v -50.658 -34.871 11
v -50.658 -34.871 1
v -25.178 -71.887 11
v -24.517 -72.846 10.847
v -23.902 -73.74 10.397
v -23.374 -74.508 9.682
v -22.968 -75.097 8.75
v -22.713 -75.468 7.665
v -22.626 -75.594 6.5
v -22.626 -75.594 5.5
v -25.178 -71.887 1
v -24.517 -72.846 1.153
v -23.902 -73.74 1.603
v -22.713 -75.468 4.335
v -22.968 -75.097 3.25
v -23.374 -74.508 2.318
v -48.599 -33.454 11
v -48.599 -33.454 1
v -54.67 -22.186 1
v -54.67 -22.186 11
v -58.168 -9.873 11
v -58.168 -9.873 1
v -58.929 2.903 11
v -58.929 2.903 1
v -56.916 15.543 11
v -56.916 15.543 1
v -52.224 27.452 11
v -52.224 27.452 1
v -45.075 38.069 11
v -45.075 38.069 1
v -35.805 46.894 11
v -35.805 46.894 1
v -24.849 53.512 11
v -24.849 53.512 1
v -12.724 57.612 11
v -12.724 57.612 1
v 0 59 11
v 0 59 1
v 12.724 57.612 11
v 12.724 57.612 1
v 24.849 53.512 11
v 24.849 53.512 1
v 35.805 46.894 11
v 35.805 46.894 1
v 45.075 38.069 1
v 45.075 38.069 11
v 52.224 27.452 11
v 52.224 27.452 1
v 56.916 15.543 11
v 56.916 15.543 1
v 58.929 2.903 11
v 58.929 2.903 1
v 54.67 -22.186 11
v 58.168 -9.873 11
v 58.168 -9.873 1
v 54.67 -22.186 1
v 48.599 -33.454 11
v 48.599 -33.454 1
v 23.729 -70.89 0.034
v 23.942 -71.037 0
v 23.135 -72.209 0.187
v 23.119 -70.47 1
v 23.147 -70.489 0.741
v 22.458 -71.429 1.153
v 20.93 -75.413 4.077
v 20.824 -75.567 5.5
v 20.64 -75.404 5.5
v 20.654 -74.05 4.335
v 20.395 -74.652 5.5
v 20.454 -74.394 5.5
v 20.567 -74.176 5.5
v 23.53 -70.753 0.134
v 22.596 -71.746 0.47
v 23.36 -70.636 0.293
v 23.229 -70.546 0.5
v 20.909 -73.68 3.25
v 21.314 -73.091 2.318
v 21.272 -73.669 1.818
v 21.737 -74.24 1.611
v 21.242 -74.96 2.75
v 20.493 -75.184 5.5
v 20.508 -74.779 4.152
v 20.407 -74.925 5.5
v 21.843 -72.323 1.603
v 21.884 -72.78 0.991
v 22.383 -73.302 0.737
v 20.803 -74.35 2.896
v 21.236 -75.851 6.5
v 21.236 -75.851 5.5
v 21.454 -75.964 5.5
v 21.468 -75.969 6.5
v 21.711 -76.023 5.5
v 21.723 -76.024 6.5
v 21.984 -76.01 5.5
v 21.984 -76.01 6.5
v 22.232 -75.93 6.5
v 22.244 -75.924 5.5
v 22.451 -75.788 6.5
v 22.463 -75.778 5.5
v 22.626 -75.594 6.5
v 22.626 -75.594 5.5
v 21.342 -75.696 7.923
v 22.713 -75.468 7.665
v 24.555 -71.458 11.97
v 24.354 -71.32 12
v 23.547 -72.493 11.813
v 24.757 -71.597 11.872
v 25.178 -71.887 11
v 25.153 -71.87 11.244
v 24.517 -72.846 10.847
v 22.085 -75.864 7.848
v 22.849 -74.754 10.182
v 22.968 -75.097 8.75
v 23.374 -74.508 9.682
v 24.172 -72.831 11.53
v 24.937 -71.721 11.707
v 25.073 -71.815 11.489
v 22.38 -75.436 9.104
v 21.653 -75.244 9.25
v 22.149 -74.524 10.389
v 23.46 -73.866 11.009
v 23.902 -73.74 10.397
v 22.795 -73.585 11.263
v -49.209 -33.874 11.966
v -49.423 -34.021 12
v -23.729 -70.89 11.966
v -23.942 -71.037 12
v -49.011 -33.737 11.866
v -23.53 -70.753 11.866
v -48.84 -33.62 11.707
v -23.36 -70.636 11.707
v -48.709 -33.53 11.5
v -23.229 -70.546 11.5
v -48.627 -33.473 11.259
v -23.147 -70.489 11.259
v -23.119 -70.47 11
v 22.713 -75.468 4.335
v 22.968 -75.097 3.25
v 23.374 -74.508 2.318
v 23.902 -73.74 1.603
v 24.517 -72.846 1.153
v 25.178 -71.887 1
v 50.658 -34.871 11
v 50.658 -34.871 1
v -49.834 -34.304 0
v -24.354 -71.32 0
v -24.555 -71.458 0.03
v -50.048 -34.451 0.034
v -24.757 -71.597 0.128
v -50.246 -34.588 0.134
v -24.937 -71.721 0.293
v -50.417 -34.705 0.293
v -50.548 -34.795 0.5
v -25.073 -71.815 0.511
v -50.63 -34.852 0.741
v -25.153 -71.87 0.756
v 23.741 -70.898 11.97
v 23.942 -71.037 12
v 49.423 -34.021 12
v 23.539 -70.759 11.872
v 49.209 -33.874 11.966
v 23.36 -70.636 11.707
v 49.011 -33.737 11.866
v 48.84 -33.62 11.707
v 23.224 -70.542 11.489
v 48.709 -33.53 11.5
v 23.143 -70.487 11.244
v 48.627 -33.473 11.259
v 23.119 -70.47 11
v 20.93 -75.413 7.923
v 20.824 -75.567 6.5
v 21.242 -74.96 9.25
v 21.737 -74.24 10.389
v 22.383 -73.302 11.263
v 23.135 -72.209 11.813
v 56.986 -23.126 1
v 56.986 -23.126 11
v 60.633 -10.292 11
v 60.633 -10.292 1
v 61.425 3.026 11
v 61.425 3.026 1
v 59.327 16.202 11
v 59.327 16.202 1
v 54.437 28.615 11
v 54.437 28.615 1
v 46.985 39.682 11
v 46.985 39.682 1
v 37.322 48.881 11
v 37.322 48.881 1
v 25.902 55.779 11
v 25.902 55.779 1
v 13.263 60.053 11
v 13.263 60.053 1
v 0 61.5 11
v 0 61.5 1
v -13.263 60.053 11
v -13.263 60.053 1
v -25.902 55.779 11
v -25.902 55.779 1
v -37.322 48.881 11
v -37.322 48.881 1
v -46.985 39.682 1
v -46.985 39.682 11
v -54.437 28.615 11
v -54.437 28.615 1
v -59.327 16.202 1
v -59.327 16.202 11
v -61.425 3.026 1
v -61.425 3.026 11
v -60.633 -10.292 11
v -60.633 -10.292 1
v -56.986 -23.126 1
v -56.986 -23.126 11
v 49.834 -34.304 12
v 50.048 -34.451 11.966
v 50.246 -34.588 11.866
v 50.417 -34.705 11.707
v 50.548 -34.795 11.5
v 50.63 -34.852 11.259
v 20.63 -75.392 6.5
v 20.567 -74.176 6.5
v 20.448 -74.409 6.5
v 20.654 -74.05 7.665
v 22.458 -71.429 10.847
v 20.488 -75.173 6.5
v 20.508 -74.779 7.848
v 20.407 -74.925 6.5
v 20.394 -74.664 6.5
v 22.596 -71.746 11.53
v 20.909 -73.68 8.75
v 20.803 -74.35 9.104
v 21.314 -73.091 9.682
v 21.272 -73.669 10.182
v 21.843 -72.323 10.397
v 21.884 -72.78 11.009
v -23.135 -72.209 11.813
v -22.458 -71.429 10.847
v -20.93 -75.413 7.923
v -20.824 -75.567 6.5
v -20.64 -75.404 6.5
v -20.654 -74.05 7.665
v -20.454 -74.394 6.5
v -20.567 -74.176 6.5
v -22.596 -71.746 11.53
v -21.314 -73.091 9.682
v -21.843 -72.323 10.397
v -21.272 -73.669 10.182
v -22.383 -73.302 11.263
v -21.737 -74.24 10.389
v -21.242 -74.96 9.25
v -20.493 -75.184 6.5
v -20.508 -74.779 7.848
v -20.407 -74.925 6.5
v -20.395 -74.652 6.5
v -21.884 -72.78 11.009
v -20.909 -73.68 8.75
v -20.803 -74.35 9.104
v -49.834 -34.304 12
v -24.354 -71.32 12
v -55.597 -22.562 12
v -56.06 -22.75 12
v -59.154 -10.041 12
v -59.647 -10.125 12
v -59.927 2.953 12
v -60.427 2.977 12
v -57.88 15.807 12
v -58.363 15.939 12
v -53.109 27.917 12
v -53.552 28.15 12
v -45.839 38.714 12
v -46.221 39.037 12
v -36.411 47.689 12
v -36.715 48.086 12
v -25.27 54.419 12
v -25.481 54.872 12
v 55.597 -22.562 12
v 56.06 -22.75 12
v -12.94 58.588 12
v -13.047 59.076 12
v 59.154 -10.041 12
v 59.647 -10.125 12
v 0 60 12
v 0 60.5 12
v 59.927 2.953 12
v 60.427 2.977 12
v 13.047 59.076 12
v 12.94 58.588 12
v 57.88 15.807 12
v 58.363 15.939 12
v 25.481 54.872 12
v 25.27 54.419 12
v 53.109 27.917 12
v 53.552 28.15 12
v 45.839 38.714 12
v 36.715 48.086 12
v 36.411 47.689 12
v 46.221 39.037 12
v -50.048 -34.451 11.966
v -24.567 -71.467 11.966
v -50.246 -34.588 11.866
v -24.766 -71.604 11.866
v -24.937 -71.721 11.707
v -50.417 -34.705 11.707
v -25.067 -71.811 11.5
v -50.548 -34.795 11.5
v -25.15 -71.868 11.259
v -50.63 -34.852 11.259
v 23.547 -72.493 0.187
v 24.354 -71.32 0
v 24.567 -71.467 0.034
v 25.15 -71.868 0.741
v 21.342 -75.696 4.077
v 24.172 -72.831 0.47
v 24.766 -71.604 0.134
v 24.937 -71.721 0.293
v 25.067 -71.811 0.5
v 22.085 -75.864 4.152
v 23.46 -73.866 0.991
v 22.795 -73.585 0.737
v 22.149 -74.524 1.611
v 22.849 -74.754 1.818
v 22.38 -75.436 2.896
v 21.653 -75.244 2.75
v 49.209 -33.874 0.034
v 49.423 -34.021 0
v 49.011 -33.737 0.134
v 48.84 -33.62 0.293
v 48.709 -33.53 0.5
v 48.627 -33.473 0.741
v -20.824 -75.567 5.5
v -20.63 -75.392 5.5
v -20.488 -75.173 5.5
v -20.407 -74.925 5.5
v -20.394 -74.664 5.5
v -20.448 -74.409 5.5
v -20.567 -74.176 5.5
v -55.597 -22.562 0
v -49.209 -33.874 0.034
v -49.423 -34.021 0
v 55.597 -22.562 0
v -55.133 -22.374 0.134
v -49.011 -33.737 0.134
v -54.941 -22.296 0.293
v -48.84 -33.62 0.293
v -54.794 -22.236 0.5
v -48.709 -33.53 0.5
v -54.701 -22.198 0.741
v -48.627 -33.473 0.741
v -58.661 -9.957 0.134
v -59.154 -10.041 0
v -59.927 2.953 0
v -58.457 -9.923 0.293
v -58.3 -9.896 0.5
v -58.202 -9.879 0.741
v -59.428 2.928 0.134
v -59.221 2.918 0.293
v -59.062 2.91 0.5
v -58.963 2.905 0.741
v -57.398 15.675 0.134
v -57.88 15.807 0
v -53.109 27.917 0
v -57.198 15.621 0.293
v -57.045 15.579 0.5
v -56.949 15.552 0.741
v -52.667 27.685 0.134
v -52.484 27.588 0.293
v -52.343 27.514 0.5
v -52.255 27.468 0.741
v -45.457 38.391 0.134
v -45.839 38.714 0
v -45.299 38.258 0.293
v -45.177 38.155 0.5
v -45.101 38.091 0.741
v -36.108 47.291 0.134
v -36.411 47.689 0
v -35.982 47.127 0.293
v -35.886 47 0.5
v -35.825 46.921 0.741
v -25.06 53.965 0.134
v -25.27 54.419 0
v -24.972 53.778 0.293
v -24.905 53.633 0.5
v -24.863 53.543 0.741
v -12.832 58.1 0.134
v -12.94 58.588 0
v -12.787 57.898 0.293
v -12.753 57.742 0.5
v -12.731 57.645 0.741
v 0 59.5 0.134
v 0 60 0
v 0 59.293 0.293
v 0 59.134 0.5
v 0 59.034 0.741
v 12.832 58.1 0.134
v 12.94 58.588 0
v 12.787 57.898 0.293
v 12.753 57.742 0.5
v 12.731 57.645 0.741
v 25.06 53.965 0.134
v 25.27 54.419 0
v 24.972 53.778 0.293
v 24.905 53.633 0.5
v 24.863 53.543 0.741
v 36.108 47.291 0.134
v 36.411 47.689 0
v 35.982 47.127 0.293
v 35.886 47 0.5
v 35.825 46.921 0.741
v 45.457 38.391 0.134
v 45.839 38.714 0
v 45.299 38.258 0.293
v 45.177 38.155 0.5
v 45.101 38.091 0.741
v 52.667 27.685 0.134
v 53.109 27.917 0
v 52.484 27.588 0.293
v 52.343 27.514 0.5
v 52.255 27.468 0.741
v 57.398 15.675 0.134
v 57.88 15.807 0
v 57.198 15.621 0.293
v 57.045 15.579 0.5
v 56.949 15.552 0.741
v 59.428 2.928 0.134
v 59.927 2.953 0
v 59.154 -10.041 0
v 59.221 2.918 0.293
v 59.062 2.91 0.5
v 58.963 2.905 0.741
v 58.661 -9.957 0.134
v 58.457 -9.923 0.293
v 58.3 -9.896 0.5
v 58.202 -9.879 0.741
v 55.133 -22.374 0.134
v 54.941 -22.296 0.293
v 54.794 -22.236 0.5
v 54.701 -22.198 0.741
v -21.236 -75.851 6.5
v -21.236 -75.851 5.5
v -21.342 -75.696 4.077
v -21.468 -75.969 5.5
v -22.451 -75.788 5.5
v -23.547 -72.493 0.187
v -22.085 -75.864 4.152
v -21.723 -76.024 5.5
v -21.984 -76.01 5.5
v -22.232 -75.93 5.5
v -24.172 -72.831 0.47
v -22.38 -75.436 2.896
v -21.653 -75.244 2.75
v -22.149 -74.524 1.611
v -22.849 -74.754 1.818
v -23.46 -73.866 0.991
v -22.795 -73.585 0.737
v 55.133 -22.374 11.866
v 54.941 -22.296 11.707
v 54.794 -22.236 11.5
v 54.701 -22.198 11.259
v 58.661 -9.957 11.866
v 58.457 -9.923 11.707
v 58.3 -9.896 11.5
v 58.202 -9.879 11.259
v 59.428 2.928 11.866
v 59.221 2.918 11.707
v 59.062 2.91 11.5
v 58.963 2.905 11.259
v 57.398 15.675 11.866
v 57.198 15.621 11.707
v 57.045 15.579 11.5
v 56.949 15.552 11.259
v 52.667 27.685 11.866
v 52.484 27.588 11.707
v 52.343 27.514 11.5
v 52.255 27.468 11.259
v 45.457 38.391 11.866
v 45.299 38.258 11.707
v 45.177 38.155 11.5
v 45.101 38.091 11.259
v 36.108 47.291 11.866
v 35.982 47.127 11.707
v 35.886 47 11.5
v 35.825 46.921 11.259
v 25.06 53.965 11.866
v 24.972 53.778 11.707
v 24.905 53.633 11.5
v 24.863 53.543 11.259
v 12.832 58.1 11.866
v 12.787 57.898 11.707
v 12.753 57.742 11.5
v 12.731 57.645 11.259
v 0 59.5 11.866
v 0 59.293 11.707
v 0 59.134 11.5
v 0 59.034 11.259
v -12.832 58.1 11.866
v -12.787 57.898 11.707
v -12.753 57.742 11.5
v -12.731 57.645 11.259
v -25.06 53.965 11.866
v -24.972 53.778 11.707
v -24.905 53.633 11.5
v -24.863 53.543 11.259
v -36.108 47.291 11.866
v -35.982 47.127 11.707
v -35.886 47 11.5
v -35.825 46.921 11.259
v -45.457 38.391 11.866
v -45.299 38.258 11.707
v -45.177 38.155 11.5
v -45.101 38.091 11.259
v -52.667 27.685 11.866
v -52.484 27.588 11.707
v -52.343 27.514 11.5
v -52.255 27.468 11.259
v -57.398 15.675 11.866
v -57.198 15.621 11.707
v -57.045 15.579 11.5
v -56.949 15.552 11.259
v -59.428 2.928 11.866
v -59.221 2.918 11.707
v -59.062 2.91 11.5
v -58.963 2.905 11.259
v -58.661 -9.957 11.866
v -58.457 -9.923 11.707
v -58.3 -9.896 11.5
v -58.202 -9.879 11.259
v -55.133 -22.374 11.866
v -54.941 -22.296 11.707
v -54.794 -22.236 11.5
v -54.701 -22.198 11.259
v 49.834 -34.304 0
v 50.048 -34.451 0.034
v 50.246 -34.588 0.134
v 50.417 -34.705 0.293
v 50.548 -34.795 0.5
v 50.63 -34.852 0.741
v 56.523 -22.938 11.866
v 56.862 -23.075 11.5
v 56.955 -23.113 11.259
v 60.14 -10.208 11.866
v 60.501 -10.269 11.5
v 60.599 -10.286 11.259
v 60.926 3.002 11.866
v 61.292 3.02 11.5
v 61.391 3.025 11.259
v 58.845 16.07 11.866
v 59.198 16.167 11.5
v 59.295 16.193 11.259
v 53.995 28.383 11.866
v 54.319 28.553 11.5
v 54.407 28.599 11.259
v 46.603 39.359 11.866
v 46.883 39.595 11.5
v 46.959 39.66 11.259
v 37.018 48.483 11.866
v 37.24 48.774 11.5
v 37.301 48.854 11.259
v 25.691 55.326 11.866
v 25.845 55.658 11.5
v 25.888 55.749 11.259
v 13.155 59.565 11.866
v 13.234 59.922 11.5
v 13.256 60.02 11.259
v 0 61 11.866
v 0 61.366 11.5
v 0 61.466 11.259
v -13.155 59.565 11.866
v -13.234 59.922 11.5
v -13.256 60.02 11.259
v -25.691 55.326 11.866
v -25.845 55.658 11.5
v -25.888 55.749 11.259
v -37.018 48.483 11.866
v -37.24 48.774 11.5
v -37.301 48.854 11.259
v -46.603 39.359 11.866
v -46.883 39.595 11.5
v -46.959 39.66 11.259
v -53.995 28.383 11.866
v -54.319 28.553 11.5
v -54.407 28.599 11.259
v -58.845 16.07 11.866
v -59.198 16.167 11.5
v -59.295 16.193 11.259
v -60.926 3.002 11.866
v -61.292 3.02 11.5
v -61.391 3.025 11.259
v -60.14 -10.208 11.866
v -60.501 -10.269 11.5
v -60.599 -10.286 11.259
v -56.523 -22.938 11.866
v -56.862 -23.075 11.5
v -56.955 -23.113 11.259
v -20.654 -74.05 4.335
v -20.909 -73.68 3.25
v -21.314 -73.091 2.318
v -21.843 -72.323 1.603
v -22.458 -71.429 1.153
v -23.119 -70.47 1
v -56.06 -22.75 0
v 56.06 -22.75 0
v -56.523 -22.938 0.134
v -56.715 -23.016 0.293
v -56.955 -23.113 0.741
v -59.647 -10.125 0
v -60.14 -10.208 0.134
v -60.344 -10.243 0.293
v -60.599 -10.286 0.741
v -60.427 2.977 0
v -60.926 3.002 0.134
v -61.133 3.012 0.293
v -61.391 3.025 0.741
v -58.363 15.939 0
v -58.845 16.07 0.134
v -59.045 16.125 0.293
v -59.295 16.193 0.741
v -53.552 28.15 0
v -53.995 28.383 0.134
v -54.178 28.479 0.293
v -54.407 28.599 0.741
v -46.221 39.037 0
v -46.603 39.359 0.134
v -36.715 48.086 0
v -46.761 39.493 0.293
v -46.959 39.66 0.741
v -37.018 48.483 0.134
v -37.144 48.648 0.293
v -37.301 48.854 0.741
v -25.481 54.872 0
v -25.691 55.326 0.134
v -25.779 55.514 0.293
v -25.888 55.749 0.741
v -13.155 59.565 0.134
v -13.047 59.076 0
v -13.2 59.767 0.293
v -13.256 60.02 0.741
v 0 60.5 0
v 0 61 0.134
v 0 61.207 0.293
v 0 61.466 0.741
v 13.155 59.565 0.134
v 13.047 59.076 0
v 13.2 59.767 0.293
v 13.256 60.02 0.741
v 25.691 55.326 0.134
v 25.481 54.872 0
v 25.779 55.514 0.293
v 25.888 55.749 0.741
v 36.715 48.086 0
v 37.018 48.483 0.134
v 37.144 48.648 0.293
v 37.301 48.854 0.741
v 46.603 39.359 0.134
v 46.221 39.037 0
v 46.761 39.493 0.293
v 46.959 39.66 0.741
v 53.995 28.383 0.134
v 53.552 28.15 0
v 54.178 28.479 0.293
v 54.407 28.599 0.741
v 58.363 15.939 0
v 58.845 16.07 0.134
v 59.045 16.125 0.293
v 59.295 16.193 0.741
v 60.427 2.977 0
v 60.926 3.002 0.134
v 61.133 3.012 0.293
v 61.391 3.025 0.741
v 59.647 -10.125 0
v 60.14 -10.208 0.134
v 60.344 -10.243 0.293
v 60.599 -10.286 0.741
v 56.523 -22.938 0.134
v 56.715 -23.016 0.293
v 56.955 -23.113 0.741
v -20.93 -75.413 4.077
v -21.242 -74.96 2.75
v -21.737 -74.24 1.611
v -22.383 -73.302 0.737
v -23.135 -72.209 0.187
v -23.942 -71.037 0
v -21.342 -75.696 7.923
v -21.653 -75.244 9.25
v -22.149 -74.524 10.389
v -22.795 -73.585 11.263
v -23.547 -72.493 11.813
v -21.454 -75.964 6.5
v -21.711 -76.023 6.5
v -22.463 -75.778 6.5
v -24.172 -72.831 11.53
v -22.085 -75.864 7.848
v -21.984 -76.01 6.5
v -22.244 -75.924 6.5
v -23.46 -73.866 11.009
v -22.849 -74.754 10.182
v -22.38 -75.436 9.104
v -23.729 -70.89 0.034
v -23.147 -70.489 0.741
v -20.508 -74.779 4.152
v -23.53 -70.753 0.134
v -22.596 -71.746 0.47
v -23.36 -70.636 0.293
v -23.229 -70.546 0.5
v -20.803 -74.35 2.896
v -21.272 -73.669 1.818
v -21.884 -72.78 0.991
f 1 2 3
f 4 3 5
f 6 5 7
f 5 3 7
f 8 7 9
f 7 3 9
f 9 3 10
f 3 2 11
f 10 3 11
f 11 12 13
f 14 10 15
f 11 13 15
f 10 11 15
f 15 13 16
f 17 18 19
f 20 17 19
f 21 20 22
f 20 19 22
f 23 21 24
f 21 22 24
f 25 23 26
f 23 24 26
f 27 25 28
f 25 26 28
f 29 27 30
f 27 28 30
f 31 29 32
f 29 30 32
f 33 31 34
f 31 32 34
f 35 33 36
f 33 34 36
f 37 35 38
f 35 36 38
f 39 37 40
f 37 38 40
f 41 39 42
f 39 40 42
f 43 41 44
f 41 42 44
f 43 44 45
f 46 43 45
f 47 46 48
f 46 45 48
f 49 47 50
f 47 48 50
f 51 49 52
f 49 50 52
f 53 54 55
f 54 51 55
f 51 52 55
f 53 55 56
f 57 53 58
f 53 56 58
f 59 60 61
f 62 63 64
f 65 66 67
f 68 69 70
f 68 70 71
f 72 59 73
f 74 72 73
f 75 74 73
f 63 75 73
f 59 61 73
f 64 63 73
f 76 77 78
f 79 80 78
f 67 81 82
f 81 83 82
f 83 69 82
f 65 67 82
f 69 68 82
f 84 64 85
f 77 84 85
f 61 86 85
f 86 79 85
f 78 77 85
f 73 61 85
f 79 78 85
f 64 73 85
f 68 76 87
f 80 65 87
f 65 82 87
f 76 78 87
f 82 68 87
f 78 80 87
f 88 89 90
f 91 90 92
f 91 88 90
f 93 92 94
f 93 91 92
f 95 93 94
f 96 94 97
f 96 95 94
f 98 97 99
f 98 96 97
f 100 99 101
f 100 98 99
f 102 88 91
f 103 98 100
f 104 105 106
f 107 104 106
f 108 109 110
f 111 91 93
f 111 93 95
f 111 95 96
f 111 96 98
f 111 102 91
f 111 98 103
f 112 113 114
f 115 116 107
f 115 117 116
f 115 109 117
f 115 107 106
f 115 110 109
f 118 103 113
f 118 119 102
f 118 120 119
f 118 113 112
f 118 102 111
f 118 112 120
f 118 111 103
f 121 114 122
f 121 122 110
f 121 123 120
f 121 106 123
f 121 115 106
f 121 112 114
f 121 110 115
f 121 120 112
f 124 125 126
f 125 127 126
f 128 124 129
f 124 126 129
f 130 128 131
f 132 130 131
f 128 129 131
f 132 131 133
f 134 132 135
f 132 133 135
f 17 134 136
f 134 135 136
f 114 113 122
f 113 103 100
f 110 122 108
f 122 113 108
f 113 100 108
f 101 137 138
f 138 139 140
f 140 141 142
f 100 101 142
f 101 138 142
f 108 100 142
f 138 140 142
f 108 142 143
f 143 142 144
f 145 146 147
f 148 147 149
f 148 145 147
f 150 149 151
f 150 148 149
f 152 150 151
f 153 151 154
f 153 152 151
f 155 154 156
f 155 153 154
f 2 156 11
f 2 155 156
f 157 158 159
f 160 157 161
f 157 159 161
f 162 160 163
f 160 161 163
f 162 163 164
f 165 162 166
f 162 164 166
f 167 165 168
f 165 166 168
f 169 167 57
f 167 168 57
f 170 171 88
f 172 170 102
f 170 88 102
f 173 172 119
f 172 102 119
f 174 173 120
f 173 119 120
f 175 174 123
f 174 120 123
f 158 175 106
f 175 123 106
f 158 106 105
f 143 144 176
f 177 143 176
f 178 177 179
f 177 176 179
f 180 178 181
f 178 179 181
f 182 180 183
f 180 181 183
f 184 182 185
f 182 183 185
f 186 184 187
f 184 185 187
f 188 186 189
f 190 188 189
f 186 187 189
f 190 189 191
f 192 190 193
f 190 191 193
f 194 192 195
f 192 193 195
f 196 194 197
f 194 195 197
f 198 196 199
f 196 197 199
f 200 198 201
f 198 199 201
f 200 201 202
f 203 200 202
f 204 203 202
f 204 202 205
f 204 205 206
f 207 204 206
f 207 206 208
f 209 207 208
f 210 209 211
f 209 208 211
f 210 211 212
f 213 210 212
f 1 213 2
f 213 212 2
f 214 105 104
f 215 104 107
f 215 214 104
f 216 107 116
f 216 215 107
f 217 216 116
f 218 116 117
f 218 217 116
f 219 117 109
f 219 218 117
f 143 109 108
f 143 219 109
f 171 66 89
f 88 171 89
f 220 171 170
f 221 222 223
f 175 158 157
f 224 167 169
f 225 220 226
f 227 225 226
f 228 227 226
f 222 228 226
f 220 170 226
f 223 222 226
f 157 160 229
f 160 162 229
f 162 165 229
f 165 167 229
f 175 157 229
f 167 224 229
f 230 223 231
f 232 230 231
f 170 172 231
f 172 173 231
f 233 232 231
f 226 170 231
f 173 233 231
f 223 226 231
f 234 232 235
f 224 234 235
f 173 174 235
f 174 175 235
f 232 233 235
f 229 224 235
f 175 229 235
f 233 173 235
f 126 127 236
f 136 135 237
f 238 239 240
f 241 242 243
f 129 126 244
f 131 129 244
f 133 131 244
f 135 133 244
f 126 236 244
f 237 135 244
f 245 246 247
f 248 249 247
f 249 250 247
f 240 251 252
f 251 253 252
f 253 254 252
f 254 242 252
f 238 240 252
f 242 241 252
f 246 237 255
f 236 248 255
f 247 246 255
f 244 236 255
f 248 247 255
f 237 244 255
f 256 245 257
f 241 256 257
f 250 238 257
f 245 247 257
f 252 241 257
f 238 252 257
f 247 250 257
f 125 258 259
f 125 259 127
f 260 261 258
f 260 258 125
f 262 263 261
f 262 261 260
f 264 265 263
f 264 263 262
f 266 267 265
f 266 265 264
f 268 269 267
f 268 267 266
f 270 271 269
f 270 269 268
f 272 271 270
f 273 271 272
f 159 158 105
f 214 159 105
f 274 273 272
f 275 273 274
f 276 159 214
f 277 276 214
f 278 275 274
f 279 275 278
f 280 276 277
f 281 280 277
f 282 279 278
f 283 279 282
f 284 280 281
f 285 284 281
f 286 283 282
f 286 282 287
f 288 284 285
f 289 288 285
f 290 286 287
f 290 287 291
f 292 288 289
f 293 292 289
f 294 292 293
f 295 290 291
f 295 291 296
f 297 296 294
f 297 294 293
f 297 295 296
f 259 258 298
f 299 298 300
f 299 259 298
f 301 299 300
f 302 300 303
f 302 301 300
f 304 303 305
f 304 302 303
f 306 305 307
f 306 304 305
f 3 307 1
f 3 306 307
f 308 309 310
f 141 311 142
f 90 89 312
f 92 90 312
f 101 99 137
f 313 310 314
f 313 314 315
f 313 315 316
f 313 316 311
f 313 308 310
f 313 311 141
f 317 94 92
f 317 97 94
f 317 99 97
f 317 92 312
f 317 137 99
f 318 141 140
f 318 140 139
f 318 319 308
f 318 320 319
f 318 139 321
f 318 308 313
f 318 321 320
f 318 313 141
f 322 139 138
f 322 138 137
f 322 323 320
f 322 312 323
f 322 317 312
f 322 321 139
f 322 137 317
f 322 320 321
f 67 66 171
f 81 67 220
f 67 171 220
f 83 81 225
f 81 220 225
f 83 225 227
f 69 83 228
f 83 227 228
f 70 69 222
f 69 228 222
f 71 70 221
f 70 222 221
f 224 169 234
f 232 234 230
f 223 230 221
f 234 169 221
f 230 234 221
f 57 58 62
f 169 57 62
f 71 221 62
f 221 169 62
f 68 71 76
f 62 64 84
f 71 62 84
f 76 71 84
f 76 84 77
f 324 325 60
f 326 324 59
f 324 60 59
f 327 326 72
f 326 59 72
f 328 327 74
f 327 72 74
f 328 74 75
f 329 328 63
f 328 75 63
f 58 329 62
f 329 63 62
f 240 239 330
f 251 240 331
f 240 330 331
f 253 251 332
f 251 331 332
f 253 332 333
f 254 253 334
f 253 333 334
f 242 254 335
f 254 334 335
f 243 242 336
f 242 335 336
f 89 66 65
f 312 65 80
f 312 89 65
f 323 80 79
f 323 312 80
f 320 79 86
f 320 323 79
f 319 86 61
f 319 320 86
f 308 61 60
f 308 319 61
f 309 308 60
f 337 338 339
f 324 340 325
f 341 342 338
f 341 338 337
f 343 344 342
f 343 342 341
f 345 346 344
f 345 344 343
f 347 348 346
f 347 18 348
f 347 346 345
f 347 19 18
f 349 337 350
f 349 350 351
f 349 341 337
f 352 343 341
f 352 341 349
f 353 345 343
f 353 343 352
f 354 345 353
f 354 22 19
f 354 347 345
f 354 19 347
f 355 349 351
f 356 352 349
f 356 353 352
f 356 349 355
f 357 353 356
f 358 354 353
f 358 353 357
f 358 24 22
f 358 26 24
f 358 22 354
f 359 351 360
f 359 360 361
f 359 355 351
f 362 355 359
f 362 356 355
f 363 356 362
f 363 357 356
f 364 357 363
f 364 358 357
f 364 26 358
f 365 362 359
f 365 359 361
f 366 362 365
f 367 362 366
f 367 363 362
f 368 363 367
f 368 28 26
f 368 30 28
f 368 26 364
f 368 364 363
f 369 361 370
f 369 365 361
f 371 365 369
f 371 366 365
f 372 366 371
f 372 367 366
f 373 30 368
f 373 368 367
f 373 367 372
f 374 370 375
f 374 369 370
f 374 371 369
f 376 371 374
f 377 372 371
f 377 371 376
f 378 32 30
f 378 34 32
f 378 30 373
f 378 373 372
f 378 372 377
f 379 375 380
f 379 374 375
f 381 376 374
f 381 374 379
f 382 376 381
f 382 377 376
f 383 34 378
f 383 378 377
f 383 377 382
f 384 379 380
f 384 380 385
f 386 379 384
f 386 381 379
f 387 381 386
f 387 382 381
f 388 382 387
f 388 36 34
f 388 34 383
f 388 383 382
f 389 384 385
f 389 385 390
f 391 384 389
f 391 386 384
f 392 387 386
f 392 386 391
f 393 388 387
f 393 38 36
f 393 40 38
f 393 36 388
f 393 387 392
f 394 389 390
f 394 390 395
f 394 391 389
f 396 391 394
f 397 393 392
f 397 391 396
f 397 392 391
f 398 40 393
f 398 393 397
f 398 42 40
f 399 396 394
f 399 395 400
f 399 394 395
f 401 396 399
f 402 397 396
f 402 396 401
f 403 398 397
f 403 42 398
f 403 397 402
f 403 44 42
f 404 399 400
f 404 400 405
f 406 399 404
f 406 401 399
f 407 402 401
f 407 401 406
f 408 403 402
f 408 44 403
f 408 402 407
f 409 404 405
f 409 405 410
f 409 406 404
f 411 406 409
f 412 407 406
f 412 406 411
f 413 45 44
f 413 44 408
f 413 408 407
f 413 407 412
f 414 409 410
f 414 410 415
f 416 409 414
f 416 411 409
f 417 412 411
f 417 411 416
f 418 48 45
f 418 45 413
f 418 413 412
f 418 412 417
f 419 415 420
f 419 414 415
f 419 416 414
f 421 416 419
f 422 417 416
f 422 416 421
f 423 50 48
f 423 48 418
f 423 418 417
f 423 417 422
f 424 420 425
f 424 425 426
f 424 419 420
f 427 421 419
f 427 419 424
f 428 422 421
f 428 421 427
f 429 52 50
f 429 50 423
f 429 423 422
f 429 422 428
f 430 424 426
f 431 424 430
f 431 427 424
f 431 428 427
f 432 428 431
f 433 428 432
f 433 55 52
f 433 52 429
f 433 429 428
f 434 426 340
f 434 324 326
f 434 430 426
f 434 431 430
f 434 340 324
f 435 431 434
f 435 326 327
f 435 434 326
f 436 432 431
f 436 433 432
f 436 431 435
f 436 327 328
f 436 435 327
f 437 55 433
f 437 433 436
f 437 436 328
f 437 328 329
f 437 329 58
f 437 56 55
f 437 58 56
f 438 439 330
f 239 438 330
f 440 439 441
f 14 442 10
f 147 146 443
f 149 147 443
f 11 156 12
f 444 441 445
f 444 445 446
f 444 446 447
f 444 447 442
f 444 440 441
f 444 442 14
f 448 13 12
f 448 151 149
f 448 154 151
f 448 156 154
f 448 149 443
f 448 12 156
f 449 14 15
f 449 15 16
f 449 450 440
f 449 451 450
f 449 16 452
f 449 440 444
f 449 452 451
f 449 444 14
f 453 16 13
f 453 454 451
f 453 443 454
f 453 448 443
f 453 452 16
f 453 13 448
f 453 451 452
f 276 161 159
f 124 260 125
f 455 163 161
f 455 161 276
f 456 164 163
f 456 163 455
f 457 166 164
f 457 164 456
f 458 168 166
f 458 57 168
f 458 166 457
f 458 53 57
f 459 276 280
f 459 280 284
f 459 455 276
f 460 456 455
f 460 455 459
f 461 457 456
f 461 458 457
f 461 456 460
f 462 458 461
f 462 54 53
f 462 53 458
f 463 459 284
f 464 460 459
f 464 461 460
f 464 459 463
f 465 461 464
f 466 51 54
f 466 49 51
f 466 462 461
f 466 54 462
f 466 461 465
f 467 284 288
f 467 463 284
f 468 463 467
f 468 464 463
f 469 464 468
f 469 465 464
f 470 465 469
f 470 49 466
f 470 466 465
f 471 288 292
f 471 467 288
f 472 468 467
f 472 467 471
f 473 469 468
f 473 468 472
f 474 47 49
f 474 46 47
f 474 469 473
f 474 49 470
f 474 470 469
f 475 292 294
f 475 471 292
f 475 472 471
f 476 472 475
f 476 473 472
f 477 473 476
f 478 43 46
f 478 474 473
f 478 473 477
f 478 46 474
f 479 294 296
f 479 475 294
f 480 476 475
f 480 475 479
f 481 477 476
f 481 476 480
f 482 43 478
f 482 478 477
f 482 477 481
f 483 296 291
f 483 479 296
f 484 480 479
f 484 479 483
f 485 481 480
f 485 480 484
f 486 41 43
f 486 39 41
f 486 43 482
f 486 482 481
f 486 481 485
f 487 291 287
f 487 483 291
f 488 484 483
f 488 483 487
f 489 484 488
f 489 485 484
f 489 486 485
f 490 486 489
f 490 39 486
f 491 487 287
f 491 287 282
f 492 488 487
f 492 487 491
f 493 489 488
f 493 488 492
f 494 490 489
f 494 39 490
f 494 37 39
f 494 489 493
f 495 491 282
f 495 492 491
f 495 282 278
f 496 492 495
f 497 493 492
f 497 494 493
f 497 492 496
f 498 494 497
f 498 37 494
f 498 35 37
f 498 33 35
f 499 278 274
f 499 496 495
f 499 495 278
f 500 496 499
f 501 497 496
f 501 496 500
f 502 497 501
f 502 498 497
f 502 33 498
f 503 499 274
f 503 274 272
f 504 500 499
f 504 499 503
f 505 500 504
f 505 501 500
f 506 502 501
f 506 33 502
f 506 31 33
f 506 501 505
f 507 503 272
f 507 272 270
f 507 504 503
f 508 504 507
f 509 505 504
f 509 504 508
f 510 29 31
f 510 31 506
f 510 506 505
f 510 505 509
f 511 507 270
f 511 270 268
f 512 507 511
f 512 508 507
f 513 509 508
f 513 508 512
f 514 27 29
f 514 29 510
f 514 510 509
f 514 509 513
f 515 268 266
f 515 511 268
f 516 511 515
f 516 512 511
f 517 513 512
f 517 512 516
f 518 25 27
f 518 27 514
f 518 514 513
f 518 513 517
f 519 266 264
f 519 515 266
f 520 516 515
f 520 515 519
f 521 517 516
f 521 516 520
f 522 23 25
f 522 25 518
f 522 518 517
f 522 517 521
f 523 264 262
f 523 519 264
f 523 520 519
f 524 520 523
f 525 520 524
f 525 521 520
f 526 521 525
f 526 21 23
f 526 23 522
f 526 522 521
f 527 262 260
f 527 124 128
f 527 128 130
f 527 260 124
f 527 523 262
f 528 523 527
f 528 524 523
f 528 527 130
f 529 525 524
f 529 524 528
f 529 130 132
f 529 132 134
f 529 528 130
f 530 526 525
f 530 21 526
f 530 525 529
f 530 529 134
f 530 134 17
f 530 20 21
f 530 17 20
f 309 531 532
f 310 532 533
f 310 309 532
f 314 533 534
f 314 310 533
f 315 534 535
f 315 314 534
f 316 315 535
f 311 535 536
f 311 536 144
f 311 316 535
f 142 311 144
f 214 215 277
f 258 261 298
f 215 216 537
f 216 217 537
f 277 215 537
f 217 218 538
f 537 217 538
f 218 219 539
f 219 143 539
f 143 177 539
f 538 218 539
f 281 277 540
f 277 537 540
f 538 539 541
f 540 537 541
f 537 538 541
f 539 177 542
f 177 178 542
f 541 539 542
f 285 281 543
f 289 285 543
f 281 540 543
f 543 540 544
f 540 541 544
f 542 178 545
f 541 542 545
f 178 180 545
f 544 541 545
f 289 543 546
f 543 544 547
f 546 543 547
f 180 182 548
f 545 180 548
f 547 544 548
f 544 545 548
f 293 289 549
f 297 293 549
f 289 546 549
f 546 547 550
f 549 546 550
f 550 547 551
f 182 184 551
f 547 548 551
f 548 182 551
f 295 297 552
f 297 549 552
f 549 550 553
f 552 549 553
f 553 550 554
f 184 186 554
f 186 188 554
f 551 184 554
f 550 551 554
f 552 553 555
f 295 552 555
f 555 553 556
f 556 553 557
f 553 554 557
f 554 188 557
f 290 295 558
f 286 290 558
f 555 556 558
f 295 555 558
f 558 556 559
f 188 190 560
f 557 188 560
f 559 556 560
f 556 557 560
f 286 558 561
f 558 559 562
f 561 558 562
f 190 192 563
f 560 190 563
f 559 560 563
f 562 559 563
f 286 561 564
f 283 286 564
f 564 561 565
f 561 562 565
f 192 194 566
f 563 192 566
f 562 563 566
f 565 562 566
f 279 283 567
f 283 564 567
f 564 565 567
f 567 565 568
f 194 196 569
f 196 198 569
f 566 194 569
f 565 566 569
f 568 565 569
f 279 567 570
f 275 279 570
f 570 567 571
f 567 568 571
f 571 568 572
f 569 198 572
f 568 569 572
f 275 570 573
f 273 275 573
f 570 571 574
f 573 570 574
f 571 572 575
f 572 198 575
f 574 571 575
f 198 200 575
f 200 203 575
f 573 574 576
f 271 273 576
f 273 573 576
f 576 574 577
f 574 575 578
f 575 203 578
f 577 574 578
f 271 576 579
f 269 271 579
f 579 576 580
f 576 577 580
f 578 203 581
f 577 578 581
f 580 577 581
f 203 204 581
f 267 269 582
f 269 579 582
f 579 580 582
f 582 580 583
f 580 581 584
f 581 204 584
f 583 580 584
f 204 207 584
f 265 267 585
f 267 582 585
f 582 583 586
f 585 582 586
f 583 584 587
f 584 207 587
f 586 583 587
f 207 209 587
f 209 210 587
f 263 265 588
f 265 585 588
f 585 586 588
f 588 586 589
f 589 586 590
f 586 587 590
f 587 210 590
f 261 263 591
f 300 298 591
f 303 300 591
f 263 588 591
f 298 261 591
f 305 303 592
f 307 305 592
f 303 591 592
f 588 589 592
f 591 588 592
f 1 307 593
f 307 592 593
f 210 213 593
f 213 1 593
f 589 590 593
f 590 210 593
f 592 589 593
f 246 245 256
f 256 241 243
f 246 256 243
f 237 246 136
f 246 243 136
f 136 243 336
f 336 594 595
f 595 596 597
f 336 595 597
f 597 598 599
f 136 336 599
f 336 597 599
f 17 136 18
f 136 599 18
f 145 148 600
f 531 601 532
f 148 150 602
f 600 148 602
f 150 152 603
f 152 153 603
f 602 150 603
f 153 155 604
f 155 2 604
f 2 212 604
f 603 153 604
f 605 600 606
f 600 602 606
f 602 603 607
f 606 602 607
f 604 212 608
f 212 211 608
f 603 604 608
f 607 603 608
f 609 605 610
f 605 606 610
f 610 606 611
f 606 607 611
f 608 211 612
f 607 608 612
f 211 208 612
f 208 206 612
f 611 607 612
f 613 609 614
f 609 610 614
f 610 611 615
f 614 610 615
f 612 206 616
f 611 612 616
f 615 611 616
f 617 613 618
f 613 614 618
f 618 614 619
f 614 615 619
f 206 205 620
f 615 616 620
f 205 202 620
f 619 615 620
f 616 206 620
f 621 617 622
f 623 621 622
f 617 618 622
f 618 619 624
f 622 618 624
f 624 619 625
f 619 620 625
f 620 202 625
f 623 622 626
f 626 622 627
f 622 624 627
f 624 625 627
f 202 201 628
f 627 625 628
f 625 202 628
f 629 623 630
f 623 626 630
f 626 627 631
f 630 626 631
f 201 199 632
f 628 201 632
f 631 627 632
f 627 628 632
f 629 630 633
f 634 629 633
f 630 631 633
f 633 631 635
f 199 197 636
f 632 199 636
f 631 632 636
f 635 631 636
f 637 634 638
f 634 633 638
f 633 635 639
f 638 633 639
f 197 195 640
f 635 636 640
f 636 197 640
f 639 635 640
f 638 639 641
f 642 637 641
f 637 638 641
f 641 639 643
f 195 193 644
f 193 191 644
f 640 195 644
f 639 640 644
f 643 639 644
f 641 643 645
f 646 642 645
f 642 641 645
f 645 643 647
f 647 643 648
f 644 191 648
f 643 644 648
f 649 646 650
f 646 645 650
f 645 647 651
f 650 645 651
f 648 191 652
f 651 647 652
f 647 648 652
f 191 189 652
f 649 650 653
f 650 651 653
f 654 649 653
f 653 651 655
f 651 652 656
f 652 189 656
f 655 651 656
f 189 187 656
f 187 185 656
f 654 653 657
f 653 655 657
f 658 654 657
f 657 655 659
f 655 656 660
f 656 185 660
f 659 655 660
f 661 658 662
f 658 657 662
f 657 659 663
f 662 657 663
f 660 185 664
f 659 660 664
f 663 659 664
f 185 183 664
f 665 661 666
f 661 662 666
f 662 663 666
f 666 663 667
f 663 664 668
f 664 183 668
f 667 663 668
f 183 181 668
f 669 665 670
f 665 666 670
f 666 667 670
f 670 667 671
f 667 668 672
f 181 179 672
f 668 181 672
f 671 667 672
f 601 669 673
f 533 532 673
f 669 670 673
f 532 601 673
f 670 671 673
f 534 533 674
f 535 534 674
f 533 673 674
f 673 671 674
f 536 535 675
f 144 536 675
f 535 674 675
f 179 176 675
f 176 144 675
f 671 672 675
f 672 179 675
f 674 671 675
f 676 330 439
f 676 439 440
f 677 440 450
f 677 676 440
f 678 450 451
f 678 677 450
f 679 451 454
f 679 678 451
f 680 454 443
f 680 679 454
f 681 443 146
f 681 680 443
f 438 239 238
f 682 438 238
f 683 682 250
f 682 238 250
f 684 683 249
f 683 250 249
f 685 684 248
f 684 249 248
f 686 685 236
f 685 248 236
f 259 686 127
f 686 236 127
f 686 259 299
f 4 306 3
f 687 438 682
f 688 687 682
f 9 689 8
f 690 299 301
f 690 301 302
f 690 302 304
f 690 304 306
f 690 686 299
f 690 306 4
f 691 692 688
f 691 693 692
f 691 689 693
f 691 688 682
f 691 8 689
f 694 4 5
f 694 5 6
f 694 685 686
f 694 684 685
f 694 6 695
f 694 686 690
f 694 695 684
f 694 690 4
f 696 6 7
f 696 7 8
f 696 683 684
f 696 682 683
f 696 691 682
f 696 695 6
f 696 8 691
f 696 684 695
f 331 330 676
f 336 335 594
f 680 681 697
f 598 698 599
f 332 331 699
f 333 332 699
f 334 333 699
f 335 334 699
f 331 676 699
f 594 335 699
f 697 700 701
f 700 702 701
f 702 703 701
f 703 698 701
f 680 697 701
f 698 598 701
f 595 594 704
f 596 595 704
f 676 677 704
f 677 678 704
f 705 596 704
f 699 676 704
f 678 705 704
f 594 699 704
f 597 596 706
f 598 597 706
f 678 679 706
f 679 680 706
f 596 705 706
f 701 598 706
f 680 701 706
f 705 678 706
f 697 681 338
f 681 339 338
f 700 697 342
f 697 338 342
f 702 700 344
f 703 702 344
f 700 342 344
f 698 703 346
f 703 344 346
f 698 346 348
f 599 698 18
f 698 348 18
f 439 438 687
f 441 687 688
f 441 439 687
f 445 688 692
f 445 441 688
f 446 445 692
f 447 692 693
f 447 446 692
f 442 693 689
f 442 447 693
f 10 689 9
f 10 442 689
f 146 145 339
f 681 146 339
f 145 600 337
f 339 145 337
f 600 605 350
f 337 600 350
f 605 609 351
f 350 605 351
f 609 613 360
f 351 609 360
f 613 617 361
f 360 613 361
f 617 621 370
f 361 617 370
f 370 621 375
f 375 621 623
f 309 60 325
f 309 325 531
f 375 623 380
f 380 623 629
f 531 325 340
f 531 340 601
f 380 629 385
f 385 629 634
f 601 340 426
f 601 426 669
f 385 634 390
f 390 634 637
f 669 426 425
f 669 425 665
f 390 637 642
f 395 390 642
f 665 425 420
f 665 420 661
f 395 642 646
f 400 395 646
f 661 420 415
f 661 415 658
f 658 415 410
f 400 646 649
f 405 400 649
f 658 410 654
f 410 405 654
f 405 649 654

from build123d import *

# Parameters (mm, degrees)
F1_DEPTH = 12
F2_R     = 5.5
F3_R     = 1


with BuildPart() as f1:
    # F0 (on Top) → F1 (new body)
    with BuildSketch(Plane.XY):
        with BuildLine():
            ThreePointArc((-48.598922, -33.453621), (0, 59), (48.598922, -33.453621))
            Line((48.598922, -33.453621), (20, -75))
            Line((20, -75), (22.059276, -76.417526))
            Line((22.059276, -76.417526), (50.658199, -34.871147))
            ThreePointArc((50.658199, -34.871147), (0, 61.5), (-50.658199, -34.871147))
            Line((-50.658199, -34.871147), (-22.059276, -76.417526))
            Line((-22.059276, -76.417526), (-20, -75))
            Line((-20, -75), (-48.598922, -33.453621))
        make_face()
    extrude(amount=F1_DEPTH)

    # F2
    f2_edges = [f1.edges().sort_by_distance(p)[0] for p in [
        (-21.029638, -75.708763, 0),
        (-21.029638, -75.708763, 12),
        (21.029638, -75.708763, 12),
        (21.029638, -75.708763, 0),
    ]]
    fillet(f2_edges, radius=F2_R)

    # F3
    f3_edges = [f1.edges().sort_by_distance(p)[0] for p in [
        (-37.918017, -53.379133, 12),
        (-35.85874, -51.961606, 0),
    ]]
    fillet(f3_edges, radius=F3_R)


solid = f1.part
